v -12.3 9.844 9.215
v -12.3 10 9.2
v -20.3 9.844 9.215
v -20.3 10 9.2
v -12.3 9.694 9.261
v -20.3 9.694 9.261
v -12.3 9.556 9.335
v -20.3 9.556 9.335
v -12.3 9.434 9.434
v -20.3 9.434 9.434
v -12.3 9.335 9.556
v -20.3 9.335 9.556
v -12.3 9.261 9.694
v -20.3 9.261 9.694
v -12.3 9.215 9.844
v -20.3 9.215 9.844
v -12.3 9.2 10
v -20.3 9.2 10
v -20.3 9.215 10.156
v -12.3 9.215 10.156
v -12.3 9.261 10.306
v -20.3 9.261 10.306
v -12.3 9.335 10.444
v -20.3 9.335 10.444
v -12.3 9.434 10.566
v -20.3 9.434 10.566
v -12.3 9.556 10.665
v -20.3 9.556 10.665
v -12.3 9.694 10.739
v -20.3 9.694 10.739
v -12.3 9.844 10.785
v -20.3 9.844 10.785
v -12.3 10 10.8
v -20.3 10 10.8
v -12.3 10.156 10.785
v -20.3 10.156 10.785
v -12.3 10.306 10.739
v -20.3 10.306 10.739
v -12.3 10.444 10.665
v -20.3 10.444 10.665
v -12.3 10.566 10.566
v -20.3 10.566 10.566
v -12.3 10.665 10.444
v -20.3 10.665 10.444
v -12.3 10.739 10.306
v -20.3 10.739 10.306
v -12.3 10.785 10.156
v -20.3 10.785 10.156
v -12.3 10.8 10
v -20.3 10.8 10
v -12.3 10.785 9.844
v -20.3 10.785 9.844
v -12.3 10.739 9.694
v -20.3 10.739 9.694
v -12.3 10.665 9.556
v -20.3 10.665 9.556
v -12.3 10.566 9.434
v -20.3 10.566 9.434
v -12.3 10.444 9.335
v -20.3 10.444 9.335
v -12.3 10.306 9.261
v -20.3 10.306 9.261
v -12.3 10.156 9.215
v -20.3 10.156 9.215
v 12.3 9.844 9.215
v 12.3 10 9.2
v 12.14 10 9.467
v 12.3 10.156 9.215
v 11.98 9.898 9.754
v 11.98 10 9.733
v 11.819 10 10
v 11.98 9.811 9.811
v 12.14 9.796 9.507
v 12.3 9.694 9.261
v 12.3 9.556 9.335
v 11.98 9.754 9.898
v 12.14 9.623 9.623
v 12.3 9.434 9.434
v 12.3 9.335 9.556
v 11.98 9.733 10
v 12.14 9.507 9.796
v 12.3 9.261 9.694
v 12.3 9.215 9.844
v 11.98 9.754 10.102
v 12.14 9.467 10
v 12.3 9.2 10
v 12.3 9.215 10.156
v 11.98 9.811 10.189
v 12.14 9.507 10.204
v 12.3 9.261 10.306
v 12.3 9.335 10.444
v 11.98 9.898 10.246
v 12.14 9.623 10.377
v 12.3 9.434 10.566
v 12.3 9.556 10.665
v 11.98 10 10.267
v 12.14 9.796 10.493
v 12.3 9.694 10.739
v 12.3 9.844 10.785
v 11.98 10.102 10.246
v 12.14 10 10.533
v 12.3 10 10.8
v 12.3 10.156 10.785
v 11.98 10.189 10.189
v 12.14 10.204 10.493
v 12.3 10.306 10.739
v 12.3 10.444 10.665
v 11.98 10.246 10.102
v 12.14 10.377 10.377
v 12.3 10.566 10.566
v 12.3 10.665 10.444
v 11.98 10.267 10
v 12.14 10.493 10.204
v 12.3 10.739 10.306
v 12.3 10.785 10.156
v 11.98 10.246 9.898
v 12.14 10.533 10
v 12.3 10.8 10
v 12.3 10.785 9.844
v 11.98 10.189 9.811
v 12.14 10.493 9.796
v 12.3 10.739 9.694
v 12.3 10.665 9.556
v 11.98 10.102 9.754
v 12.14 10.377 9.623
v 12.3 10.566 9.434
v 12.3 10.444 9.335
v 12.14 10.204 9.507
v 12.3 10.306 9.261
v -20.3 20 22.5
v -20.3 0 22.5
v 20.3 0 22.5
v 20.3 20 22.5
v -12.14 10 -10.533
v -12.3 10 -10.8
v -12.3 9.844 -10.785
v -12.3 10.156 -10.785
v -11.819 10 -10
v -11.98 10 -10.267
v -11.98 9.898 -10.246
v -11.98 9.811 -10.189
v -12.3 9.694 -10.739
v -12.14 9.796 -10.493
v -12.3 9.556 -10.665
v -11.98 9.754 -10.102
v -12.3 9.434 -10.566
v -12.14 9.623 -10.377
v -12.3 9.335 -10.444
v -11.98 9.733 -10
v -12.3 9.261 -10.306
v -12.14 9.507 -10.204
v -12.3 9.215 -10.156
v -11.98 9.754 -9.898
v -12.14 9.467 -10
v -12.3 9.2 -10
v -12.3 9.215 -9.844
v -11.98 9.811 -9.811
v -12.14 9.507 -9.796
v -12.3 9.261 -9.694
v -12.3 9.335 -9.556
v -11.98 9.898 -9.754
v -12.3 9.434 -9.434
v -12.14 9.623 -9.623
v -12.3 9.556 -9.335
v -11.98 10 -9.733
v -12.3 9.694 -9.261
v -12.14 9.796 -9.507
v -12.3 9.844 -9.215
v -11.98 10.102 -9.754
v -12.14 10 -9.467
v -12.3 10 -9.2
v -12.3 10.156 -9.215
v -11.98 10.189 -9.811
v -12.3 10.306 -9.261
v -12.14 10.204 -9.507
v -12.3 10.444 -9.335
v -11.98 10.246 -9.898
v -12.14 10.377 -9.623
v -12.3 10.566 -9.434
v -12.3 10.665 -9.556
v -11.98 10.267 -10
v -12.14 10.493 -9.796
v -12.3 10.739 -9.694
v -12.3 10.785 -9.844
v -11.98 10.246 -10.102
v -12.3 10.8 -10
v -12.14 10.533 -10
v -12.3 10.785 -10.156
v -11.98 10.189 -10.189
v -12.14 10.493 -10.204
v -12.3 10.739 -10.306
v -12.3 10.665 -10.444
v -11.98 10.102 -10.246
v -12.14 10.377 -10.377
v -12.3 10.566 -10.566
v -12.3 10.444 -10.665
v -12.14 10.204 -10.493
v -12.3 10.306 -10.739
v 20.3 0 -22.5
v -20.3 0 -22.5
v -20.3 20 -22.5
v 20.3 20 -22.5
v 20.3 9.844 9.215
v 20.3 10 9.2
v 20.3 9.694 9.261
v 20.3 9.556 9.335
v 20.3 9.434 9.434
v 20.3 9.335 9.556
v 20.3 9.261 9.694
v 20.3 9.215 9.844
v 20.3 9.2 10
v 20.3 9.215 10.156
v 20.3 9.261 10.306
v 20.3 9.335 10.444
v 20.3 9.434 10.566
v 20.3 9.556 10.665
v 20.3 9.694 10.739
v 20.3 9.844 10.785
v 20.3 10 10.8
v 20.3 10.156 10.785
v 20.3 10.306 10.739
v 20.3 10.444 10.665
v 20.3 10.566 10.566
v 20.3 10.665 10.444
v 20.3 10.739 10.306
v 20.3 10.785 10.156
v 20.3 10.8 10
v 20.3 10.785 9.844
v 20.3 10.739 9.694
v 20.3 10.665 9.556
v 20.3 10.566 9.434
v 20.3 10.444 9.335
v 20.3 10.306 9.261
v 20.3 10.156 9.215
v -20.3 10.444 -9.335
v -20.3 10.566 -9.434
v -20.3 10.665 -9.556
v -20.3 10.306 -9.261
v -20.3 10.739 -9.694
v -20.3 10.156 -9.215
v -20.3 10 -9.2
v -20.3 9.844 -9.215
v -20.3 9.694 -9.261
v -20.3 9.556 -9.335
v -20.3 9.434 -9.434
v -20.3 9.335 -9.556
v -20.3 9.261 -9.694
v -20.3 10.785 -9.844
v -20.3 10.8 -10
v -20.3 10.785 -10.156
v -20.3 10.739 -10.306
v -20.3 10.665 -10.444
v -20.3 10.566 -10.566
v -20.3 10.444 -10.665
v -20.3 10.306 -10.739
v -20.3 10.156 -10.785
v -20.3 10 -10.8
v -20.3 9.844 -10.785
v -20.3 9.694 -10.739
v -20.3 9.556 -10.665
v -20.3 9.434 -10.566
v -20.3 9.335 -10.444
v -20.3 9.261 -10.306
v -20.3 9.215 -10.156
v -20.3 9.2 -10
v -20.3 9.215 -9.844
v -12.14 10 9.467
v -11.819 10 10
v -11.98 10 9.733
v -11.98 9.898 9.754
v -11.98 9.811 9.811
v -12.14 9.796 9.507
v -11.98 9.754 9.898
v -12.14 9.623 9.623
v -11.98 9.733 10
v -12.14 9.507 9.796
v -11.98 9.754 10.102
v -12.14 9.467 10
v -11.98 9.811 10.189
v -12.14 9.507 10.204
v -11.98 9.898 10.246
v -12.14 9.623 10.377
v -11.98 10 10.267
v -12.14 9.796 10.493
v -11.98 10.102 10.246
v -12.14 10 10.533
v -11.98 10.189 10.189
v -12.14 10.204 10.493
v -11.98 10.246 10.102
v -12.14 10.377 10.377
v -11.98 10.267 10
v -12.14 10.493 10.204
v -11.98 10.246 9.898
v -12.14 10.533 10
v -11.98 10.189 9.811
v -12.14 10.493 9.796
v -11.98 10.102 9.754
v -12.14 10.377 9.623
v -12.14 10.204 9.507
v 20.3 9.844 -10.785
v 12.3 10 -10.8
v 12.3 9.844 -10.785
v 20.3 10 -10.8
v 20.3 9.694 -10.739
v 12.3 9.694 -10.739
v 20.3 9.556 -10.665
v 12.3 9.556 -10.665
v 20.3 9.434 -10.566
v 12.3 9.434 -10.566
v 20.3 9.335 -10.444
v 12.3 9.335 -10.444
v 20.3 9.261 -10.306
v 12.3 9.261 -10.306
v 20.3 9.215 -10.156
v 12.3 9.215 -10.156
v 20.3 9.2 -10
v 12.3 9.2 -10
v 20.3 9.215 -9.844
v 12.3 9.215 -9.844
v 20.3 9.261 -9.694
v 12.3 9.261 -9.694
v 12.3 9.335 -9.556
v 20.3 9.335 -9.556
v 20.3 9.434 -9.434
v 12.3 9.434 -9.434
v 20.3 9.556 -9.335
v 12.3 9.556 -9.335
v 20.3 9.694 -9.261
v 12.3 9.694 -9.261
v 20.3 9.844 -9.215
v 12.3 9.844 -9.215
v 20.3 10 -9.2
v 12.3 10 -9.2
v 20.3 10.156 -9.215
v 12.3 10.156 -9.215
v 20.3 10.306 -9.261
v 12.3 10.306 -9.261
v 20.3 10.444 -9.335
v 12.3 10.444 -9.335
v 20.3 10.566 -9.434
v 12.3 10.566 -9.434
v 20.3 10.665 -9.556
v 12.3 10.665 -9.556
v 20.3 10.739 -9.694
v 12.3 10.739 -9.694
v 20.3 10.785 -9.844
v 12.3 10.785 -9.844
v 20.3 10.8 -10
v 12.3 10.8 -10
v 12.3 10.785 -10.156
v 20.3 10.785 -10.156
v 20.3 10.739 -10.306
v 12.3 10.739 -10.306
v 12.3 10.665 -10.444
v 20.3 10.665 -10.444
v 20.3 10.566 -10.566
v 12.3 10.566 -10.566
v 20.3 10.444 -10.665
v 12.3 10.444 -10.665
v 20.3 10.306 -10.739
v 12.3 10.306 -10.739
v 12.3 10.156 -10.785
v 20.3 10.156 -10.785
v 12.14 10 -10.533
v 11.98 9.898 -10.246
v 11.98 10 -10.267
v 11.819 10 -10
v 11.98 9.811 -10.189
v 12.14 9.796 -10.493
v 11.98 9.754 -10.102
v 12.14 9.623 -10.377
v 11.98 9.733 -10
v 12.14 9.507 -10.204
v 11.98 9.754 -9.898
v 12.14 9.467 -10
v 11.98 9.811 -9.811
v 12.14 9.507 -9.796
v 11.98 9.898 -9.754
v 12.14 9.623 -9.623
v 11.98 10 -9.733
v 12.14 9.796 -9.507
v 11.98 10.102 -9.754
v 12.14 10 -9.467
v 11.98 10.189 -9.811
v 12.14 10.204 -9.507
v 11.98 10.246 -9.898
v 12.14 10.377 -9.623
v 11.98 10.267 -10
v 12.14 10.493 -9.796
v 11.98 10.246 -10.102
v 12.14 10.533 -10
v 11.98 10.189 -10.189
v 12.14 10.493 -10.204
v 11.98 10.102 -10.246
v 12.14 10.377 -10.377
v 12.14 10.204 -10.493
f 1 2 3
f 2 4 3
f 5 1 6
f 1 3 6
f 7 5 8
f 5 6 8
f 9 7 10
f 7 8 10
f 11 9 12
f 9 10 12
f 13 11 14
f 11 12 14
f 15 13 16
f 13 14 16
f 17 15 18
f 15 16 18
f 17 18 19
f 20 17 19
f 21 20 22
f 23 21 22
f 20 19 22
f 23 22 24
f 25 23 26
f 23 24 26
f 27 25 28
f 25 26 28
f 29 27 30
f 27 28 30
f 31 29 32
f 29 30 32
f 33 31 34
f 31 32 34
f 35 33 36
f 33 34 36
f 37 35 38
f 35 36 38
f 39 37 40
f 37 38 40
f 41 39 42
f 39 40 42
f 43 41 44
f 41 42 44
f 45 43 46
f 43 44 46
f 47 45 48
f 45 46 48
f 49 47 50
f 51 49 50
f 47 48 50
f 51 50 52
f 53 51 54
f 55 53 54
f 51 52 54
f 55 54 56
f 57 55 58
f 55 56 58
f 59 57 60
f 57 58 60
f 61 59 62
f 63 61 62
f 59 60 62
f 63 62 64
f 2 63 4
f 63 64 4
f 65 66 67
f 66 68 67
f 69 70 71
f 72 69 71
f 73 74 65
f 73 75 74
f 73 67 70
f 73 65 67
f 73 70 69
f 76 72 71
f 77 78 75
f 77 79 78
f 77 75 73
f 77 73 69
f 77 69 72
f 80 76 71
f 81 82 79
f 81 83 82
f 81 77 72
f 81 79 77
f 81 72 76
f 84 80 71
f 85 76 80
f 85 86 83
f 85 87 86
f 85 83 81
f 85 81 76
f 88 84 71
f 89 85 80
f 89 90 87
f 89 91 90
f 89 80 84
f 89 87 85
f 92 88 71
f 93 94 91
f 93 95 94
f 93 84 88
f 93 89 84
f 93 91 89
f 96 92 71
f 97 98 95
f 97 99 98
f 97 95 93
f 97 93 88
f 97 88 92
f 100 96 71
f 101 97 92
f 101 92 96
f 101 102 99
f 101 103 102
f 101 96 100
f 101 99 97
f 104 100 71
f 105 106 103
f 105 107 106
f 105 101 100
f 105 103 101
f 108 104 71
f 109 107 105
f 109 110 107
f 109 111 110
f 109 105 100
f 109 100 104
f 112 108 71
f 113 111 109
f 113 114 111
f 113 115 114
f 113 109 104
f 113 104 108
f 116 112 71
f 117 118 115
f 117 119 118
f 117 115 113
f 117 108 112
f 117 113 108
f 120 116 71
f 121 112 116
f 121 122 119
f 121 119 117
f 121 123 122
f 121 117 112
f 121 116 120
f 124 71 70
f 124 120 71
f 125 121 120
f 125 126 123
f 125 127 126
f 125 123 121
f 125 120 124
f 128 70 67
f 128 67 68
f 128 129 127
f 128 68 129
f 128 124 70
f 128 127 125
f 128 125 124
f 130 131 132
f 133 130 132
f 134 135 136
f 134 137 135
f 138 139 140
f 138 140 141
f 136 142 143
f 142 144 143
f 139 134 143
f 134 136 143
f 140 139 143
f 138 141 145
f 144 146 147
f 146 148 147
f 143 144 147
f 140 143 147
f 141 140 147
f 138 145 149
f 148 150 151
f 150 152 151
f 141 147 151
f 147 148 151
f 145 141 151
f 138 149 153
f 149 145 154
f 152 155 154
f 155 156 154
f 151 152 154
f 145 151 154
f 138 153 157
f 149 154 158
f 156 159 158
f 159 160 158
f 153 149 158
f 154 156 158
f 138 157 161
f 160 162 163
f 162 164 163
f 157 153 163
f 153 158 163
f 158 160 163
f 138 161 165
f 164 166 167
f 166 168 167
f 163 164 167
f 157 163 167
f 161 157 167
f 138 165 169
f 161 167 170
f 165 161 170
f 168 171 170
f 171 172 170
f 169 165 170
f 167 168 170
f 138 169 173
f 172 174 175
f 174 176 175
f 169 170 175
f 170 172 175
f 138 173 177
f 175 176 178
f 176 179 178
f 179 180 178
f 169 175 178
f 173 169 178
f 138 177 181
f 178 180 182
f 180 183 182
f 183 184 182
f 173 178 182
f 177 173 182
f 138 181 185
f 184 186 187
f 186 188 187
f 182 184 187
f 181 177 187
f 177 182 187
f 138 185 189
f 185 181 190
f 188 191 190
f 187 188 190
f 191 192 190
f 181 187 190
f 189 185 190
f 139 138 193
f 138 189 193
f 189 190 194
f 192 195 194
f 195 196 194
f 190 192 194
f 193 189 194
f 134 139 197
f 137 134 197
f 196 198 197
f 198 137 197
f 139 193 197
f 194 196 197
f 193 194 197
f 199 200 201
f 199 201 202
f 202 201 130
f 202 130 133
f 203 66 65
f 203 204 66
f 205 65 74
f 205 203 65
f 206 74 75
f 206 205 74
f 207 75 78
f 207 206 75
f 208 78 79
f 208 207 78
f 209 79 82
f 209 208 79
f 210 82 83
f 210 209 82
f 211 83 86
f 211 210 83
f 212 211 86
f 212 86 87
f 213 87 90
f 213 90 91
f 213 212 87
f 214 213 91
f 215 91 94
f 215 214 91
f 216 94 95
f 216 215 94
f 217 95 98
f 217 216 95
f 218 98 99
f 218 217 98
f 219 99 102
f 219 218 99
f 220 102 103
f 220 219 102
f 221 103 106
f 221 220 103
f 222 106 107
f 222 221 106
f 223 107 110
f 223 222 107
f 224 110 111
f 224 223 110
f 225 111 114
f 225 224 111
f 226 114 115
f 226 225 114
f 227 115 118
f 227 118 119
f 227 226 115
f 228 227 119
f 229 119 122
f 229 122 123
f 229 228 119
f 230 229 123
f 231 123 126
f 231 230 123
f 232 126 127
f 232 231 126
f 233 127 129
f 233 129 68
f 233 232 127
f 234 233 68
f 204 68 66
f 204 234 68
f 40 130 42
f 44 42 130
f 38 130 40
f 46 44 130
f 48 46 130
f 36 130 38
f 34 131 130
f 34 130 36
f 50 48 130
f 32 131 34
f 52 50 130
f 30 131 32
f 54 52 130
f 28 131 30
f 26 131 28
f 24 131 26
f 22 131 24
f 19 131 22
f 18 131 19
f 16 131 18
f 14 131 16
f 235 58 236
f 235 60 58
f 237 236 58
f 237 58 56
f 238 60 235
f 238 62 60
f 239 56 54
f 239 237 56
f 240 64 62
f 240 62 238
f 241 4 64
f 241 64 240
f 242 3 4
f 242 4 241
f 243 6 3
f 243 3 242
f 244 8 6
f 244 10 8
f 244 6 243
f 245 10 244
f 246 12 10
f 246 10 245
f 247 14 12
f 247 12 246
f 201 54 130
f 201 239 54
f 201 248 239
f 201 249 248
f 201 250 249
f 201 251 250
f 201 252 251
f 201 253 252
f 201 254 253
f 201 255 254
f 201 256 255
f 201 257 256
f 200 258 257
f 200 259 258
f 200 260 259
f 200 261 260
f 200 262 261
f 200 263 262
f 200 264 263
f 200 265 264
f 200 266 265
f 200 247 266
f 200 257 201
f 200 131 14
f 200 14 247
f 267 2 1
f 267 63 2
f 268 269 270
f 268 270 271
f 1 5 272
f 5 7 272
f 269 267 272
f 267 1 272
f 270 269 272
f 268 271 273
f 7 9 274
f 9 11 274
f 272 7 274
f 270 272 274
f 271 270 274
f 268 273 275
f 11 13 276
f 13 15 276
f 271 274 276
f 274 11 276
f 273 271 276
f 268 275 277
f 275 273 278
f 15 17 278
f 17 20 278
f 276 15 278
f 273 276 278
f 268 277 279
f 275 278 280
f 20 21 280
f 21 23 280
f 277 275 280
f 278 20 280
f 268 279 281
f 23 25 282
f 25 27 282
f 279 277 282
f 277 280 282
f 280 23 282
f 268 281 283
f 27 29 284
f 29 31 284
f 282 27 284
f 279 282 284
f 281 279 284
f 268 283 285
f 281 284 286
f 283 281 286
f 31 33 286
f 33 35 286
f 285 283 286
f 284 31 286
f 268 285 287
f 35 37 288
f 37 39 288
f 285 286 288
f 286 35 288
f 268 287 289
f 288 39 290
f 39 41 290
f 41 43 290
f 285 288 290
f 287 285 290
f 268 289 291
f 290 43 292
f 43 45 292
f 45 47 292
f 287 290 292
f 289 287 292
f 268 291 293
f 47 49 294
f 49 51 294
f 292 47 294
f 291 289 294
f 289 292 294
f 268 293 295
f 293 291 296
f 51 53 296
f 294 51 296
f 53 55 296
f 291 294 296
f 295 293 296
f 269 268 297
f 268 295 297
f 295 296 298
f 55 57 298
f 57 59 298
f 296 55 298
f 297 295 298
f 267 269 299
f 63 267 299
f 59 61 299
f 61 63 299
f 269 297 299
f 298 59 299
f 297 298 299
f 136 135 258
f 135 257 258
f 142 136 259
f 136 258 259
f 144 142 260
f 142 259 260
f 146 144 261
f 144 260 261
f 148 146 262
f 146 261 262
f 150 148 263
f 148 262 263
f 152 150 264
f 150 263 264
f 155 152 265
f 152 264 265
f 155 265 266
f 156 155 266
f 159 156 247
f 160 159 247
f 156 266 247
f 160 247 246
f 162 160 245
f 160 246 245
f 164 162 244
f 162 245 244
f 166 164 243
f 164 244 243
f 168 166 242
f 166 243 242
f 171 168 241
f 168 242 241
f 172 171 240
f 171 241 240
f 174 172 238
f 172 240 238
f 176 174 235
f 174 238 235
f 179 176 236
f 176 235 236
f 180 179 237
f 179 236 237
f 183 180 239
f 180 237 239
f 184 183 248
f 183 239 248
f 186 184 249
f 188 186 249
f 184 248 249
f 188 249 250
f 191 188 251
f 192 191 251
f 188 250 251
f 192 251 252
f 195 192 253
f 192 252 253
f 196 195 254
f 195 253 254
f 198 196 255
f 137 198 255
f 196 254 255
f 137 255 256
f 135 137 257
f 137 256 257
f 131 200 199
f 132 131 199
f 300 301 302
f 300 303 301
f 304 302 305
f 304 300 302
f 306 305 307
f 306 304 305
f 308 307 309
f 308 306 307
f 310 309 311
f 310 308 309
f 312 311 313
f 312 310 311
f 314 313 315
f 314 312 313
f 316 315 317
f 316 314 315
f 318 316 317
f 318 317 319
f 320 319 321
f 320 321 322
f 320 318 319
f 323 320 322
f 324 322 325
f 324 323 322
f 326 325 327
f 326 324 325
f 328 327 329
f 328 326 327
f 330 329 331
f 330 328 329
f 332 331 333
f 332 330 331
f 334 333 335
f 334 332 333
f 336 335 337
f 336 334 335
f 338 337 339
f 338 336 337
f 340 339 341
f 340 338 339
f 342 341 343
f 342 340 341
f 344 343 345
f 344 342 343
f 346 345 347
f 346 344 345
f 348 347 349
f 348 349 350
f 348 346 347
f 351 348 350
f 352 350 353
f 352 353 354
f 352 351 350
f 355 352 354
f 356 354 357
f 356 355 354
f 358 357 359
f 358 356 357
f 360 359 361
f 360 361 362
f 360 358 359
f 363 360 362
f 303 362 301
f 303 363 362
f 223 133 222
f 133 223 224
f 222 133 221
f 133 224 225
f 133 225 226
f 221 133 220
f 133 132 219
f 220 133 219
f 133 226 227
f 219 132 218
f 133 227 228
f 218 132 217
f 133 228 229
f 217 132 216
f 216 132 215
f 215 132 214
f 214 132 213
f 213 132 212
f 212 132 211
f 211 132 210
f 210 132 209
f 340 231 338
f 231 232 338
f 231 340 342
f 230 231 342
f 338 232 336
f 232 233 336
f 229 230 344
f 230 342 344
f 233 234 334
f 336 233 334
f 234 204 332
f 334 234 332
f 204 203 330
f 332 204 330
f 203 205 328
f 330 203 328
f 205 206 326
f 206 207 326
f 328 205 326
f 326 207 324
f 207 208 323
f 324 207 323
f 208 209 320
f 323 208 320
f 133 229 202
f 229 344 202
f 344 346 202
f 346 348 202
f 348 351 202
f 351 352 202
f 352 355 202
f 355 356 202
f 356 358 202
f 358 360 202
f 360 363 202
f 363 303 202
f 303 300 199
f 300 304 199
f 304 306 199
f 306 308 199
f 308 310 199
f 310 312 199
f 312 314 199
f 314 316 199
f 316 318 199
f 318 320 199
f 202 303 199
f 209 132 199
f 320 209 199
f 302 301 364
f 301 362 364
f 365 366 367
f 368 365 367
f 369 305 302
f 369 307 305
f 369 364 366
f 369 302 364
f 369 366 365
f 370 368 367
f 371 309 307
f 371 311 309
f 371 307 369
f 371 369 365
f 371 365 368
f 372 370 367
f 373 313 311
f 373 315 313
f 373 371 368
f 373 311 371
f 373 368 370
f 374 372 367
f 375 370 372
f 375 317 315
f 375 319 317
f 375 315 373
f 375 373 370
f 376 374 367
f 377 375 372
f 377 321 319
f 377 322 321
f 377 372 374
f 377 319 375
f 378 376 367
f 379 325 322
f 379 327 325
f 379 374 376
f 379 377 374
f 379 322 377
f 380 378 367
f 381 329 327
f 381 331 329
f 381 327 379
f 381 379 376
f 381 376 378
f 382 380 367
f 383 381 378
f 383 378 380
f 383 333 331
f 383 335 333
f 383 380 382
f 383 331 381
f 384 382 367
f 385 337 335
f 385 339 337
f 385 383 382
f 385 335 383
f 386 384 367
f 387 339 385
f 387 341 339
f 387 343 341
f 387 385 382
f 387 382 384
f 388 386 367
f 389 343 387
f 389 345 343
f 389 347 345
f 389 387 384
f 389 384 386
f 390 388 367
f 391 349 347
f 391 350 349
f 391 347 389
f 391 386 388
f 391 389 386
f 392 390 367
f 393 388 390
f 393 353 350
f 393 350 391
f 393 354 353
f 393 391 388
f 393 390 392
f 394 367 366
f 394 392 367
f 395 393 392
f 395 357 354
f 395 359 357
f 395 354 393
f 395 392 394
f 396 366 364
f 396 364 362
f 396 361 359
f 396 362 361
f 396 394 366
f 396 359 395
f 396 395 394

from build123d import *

# Parameters (mm, degrees)
SKETCH_1_W                  = 40.6
SKETCH_1_H                  = 45
EXTRUDE_1_DEPTH             = 20
HOLE_WIZARD_M2_1_AT_2_COUNT = 2
HOLE_WIZARD_M2_1_AT_2_PITCH = 20


with BuildPart() as part:
    # 草图1 → 凸台-拉伸1 (new body)
    with BuildSketch(Plane(origin=(0, 0, 0), x_dir=(1, 0, 0), z_dir=(0, 1, 0))):
        Rectangle(SKETCH_1_W, SKETCH_1_H)
    extrude(amount=EXTRUDE_1_DEPTH)

    # 草图3 → M2 螺纹孔的螺纹孔钻头1 (revolve, cut)
    with BuildSketch(Plane(origin=(20.3, 10, 10), x_dir=(0, 0, -1), z_dir=(0, 1, 0))):
        Polygon((0, 0), (0, 8.480688495), (0.8, 8), (0.8, 0), align=None)
    hole_wizard_m2_1 = revolve(axis=Axis((26.65, 10, 10), (-1, 0, 0)), mode=Mode.SUBTRACT)

    # M2 螺纹孔的螺纹孔钻头1 at 2: M2 螺纹孔的螺纹孔钻头1 ×2
    with Locations(*[(0, 0, -i * HOLE_WIZARD_M2_1_AT_2_PITCH) for i in range(1, HOLE_WIZARD_M2_1_AT_2_COUNT)]):
        add(hole_wizard_m2_1, mode=Mode.SUBTRACT)

    # 镜向1: M2 螺纹孔的螺纹孔钻头1 across plane
    add(hole_wizard_m2_1.mirror(Plane(origin=(0, 0, 0), x_dir=(0, 0, 1), z_dir=(1, 0, 0))), mode=Mode.SUBTRACT)

    # 镜向1 copy 1 sketch → 镜向1 copy 1 (revolve, cut)
    with BuildSketch(Plane(origin=(-20.3, 10, -10), x_dir=(0, 0, -1), z_dir=(0, 1, 0))):
        Polygon((0, 0), (0, -8.480688495), (0.8, -8), (0.8, 0), align=None)
    revolve(axis=Axis((-26.65, 10, -10), (-1, 0, 0)), mode=Mode.SUBTRACT)


solid = part.part
